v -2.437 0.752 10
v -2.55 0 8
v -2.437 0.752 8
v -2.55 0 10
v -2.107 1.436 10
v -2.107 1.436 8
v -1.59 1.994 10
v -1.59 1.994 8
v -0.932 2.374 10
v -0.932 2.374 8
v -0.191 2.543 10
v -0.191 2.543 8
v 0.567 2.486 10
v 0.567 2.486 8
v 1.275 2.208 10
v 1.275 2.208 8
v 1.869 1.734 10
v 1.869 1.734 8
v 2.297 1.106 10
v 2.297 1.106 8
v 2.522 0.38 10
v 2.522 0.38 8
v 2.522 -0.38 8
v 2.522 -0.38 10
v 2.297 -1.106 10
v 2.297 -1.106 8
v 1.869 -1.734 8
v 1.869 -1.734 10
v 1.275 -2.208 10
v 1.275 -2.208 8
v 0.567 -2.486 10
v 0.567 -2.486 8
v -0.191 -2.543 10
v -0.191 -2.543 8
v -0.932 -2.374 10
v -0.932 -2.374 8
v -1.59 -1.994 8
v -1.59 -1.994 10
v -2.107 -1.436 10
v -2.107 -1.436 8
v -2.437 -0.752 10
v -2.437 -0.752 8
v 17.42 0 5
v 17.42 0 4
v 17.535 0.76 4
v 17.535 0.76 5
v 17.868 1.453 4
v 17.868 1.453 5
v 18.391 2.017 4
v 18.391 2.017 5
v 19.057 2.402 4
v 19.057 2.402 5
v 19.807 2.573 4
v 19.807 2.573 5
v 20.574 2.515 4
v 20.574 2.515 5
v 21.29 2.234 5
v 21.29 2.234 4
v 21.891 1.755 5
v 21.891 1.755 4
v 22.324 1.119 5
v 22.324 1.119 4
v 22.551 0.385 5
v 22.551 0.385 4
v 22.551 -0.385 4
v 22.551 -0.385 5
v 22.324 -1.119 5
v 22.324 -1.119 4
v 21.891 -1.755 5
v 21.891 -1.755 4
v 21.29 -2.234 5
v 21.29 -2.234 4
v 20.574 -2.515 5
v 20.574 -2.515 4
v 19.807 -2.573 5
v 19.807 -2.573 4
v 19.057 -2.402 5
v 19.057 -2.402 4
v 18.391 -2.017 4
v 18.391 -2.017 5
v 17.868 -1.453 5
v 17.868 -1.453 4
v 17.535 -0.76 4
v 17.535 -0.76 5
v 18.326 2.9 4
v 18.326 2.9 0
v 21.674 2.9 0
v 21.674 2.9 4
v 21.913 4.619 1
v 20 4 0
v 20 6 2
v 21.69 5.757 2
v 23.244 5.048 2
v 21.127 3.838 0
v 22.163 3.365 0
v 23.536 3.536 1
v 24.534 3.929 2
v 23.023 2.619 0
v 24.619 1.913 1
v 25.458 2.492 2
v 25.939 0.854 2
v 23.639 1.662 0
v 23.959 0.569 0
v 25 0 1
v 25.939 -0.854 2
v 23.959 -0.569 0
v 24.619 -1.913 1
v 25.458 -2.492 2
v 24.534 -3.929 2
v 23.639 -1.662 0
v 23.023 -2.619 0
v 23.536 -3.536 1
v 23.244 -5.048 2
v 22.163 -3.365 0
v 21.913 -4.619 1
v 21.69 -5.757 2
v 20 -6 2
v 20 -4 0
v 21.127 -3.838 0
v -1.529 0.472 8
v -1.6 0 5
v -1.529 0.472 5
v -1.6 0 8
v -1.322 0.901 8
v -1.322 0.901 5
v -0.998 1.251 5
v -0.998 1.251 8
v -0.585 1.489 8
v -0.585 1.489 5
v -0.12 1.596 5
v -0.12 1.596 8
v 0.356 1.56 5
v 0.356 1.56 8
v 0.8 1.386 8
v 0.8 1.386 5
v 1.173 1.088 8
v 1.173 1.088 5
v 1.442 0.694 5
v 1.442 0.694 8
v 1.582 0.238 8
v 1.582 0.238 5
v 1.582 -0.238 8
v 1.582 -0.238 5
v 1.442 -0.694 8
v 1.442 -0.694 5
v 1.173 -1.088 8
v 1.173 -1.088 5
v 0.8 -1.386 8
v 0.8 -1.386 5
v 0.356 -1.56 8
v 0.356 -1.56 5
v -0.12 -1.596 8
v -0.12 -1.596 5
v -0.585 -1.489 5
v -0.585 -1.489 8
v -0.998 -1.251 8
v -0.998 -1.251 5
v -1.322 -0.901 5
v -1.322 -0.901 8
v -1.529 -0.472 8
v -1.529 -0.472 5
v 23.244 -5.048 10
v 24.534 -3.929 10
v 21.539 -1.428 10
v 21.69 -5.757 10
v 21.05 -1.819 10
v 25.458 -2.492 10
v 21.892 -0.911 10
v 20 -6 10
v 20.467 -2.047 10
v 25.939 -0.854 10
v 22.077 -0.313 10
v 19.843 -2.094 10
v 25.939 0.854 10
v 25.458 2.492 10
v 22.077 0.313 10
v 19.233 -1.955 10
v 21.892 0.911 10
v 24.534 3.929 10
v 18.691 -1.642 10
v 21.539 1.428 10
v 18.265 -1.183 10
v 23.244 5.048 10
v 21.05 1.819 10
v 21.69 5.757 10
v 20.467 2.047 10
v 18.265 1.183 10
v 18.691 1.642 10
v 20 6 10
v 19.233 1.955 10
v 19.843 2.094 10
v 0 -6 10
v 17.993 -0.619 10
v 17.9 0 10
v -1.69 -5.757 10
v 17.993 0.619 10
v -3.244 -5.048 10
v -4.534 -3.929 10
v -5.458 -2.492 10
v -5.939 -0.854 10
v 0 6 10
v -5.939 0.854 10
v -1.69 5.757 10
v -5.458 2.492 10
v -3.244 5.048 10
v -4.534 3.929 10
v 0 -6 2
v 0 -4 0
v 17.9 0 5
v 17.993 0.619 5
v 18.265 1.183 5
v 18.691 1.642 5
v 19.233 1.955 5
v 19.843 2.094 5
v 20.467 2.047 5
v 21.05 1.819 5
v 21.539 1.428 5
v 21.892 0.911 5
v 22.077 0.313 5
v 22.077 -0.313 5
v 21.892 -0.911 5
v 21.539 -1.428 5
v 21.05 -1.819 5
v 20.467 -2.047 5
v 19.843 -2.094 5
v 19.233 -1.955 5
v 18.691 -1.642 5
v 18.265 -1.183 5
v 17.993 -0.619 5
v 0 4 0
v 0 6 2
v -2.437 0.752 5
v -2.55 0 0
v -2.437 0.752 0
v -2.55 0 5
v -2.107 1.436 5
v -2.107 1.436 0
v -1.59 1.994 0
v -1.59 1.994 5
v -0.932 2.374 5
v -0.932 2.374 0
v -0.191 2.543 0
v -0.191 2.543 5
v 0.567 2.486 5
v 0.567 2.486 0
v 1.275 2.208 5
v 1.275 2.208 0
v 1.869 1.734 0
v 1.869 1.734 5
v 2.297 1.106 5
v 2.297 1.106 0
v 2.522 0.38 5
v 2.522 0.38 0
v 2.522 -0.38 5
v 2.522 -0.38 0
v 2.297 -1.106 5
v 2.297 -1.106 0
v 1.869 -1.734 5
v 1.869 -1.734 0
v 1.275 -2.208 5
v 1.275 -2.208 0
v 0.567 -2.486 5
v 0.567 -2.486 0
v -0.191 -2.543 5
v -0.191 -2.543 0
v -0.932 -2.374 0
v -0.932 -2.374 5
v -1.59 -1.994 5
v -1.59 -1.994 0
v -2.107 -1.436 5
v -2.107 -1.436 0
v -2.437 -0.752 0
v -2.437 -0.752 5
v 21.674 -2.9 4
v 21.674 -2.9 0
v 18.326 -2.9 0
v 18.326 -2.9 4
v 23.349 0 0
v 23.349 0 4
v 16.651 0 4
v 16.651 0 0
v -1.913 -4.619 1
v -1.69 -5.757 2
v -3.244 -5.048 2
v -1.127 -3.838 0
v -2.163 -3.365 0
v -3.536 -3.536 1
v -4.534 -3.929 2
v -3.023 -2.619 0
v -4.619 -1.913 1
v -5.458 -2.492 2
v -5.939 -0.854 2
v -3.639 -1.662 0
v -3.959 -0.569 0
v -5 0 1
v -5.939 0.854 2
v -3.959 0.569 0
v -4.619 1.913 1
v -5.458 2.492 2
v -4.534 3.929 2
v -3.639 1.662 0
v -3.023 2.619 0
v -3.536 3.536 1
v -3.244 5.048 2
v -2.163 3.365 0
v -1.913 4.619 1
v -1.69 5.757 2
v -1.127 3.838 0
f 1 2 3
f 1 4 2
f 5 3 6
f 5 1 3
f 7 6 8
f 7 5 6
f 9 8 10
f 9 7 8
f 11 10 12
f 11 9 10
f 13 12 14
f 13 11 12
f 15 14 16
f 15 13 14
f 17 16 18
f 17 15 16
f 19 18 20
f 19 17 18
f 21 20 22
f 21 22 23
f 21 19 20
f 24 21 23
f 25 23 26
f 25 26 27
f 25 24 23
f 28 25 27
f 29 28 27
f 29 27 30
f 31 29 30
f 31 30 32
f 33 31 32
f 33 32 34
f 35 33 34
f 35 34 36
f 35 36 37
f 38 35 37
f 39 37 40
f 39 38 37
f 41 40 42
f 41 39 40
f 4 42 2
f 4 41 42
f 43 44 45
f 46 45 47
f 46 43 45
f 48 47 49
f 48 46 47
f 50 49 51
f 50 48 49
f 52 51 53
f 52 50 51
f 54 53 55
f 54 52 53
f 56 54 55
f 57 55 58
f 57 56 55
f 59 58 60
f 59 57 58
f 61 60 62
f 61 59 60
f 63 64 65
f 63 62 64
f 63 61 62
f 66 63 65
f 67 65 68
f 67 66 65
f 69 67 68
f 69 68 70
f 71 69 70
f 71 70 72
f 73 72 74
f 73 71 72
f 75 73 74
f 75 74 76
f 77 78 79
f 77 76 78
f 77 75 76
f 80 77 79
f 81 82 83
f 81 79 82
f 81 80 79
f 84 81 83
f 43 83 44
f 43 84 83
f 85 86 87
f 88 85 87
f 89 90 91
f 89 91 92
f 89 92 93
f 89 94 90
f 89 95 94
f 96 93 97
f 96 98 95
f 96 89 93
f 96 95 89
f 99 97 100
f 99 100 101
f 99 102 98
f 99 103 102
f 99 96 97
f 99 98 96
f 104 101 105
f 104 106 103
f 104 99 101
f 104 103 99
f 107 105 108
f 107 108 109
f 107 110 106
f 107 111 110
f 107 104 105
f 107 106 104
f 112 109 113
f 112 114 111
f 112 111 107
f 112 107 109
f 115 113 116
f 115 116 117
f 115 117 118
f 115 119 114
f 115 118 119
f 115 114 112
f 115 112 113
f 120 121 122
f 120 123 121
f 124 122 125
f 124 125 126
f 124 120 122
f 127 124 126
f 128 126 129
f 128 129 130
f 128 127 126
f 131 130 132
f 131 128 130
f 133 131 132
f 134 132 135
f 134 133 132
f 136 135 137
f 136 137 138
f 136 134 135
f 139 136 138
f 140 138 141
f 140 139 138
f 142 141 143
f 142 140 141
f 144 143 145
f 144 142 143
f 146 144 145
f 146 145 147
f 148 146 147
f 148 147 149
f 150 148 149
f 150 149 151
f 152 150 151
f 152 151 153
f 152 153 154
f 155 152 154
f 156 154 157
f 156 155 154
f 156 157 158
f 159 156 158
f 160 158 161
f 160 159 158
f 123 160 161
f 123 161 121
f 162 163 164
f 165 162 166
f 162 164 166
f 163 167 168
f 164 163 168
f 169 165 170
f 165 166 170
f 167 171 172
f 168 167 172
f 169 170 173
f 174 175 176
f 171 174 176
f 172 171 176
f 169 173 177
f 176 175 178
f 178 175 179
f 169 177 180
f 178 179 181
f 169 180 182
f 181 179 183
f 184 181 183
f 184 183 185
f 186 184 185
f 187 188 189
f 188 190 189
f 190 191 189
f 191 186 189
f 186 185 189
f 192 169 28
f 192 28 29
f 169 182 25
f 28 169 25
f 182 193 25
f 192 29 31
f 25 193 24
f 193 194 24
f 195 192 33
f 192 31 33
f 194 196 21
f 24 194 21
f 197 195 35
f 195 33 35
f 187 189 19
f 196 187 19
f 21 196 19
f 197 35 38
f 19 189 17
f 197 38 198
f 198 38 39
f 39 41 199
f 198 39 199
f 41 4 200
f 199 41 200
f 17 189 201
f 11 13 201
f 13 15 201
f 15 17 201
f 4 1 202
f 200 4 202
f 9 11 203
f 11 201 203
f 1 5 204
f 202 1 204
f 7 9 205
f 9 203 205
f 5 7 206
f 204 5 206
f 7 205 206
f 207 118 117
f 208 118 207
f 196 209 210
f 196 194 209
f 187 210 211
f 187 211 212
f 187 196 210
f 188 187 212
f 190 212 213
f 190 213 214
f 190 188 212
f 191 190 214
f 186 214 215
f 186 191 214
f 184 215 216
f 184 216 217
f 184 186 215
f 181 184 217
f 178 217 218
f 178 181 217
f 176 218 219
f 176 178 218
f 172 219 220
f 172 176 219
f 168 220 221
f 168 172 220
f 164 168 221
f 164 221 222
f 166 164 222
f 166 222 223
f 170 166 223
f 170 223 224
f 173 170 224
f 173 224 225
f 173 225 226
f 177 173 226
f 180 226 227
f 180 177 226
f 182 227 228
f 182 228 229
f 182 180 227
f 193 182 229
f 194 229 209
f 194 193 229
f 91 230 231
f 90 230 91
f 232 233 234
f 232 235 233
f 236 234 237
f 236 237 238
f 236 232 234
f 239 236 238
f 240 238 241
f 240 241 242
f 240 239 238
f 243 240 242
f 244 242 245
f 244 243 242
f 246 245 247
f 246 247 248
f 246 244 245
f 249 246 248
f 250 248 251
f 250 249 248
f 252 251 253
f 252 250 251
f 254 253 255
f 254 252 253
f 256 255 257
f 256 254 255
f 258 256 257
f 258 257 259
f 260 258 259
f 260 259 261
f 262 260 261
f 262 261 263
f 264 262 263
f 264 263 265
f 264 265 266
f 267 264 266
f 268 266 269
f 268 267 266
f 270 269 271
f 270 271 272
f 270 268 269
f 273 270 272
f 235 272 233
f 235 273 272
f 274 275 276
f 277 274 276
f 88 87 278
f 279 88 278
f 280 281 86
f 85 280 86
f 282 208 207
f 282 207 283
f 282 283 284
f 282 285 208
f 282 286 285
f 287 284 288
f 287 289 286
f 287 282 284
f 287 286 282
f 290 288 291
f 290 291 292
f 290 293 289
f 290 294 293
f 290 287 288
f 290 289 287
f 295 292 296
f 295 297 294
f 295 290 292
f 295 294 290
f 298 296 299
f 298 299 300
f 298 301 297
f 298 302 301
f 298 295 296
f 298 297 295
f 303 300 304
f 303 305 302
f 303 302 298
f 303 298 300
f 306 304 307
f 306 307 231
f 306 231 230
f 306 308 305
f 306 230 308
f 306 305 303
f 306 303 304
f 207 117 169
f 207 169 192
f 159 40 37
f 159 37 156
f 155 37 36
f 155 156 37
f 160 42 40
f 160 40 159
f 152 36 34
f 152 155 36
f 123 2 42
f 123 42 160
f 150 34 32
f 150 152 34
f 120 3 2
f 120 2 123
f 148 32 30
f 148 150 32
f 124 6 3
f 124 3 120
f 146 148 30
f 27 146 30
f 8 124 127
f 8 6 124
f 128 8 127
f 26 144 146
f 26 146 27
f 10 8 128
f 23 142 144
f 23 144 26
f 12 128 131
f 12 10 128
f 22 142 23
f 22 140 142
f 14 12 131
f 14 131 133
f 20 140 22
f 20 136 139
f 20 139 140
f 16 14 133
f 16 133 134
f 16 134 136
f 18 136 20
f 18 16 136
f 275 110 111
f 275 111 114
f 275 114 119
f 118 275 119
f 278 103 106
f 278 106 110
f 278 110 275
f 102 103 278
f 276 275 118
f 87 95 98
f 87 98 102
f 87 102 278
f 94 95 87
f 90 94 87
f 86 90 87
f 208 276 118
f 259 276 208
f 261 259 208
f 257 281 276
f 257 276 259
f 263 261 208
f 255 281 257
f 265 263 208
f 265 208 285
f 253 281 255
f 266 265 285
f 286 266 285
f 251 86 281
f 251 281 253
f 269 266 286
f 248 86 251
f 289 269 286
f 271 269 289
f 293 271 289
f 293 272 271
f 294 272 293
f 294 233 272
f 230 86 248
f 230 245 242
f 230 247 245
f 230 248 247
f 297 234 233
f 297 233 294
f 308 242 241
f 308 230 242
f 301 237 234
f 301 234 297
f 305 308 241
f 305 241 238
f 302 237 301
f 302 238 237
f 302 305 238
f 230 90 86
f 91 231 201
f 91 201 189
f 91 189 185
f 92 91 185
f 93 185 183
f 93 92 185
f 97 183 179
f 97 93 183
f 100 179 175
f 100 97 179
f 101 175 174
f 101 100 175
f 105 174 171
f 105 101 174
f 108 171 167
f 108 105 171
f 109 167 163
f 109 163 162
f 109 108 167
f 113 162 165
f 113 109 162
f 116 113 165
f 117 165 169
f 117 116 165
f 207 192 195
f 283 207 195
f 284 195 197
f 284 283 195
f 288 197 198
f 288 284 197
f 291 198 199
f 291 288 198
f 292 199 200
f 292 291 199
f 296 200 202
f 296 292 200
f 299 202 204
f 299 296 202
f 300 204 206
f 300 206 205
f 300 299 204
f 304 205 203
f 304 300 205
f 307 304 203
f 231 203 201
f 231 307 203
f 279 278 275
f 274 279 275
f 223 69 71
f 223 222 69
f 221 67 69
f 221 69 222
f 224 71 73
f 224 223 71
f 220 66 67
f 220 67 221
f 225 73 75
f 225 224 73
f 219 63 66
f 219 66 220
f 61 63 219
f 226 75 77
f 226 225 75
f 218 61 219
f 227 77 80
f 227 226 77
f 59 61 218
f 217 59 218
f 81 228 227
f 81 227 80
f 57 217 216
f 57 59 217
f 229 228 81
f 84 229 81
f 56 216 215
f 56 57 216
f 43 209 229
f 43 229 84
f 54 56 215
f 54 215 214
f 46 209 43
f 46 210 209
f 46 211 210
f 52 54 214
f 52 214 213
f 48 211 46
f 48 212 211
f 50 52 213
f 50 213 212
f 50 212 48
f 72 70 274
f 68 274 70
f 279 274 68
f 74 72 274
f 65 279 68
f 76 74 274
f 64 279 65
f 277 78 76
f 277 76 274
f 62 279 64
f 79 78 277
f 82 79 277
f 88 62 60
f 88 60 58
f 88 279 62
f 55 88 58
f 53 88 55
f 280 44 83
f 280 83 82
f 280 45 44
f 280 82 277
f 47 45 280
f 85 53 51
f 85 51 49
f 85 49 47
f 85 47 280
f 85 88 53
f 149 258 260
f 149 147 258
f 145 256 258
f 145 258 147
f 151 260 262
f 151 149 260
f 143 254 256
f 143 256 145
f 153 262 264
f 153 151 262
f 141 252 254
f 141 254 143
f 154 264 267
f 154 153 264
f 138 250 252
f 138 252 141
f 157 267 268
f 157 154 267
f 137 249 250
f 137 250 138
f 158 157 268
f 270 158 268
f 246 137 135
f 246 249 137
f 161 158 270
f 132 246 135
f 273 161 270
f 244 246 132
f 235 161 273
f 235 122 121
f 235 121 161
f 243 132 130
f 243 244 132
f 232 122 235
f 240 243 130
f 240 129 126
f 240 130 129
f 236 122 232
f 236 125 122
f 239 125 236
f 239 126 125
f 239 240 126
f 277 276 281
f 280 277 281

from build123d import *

# Parameters (mm, degrees)
EXTRUDE_1_DEPTH     = 10
CHAMFER_1_SIZE      = 2
CUT_EXTRUDE_1_DEPTH = 4


with BuildPart() as part:
    # 草图1 → 凸台-拉伸1 (new body)
    with BuildSketch(Plane.XY):
        with BuildLine():
            Line((0, 6), (20, 6))
            ThreePointArc((20, 6), (26, 0), (20, -6))
            Line((20, -6), (0, -6))
            ThreePointArc((0, -6), (-6, 0), (0, 6))
        make_face()
    extrude(amount=EXTRUDE_1_DEPTH)

    # 草图2 → 切除-旋转1 (revolve, cut)
    with BuildSketch(Plane(origin=(0, 0, 0), x_dir=(1, 0, 0), z_dir=(0, 1, 0))):
        Polygon((0, 0), (-2.55, 0), (-2.55, -5), (-1.6, -5), (-1.6, -8), (-2.55, -8), (-2.55, -10), (0, -10), align=None)
    revolve(axis=Axis((0, 0, 10), (0, 0, -1)), mode=Mode.SUBTRACT)

    # 草图3 → 切除-旋转2 (revolve, cut)
    with BuildSketch(Plane(origin=(0, 0, 0), x_dir=(1, 0, 0), z_dir=(0, 1, 0))):
        Polygon((20, 0), (17.42, 0), (17.42, -5), (17.9, -5), (17.9, -10), (20, -10), align=None)
    revolve(axis=Axis((20, 0, 10), (0, 0, -1)), mode=Mode.SUBTRACT)

    # 倒角1
    chamfer_1_edges = [part.edges().sort_by_distance(p)[0] for p in [
        (10, 6, 0),
        (26, 0, 0),
        (10, -6, 0),
        (-6, 0, 0),
    ]]
    chamfer(chamfer_1_edges, length=CHAMFER_1_SIZE)

    # 草图4 → 切除-拉伸1 (cut)
    with BuildSketch(Plane(origin=(0, 0, 0), x_dir=(-1, 0, 0), z_dir=(0, 0, -1))):
        Polygon((-23.348631561, 0), (-21.674315781, -2.9), (-18.325684219, -2.9), (-16.651368439, 0), (-18.325684219, 2.9), (-21.674315781, 2.9), align=None)
    extrude(amount=-CUT_EXTRUDE_1_DEPTH, mode=Mode.SUBTRACT)


solid = part.part
